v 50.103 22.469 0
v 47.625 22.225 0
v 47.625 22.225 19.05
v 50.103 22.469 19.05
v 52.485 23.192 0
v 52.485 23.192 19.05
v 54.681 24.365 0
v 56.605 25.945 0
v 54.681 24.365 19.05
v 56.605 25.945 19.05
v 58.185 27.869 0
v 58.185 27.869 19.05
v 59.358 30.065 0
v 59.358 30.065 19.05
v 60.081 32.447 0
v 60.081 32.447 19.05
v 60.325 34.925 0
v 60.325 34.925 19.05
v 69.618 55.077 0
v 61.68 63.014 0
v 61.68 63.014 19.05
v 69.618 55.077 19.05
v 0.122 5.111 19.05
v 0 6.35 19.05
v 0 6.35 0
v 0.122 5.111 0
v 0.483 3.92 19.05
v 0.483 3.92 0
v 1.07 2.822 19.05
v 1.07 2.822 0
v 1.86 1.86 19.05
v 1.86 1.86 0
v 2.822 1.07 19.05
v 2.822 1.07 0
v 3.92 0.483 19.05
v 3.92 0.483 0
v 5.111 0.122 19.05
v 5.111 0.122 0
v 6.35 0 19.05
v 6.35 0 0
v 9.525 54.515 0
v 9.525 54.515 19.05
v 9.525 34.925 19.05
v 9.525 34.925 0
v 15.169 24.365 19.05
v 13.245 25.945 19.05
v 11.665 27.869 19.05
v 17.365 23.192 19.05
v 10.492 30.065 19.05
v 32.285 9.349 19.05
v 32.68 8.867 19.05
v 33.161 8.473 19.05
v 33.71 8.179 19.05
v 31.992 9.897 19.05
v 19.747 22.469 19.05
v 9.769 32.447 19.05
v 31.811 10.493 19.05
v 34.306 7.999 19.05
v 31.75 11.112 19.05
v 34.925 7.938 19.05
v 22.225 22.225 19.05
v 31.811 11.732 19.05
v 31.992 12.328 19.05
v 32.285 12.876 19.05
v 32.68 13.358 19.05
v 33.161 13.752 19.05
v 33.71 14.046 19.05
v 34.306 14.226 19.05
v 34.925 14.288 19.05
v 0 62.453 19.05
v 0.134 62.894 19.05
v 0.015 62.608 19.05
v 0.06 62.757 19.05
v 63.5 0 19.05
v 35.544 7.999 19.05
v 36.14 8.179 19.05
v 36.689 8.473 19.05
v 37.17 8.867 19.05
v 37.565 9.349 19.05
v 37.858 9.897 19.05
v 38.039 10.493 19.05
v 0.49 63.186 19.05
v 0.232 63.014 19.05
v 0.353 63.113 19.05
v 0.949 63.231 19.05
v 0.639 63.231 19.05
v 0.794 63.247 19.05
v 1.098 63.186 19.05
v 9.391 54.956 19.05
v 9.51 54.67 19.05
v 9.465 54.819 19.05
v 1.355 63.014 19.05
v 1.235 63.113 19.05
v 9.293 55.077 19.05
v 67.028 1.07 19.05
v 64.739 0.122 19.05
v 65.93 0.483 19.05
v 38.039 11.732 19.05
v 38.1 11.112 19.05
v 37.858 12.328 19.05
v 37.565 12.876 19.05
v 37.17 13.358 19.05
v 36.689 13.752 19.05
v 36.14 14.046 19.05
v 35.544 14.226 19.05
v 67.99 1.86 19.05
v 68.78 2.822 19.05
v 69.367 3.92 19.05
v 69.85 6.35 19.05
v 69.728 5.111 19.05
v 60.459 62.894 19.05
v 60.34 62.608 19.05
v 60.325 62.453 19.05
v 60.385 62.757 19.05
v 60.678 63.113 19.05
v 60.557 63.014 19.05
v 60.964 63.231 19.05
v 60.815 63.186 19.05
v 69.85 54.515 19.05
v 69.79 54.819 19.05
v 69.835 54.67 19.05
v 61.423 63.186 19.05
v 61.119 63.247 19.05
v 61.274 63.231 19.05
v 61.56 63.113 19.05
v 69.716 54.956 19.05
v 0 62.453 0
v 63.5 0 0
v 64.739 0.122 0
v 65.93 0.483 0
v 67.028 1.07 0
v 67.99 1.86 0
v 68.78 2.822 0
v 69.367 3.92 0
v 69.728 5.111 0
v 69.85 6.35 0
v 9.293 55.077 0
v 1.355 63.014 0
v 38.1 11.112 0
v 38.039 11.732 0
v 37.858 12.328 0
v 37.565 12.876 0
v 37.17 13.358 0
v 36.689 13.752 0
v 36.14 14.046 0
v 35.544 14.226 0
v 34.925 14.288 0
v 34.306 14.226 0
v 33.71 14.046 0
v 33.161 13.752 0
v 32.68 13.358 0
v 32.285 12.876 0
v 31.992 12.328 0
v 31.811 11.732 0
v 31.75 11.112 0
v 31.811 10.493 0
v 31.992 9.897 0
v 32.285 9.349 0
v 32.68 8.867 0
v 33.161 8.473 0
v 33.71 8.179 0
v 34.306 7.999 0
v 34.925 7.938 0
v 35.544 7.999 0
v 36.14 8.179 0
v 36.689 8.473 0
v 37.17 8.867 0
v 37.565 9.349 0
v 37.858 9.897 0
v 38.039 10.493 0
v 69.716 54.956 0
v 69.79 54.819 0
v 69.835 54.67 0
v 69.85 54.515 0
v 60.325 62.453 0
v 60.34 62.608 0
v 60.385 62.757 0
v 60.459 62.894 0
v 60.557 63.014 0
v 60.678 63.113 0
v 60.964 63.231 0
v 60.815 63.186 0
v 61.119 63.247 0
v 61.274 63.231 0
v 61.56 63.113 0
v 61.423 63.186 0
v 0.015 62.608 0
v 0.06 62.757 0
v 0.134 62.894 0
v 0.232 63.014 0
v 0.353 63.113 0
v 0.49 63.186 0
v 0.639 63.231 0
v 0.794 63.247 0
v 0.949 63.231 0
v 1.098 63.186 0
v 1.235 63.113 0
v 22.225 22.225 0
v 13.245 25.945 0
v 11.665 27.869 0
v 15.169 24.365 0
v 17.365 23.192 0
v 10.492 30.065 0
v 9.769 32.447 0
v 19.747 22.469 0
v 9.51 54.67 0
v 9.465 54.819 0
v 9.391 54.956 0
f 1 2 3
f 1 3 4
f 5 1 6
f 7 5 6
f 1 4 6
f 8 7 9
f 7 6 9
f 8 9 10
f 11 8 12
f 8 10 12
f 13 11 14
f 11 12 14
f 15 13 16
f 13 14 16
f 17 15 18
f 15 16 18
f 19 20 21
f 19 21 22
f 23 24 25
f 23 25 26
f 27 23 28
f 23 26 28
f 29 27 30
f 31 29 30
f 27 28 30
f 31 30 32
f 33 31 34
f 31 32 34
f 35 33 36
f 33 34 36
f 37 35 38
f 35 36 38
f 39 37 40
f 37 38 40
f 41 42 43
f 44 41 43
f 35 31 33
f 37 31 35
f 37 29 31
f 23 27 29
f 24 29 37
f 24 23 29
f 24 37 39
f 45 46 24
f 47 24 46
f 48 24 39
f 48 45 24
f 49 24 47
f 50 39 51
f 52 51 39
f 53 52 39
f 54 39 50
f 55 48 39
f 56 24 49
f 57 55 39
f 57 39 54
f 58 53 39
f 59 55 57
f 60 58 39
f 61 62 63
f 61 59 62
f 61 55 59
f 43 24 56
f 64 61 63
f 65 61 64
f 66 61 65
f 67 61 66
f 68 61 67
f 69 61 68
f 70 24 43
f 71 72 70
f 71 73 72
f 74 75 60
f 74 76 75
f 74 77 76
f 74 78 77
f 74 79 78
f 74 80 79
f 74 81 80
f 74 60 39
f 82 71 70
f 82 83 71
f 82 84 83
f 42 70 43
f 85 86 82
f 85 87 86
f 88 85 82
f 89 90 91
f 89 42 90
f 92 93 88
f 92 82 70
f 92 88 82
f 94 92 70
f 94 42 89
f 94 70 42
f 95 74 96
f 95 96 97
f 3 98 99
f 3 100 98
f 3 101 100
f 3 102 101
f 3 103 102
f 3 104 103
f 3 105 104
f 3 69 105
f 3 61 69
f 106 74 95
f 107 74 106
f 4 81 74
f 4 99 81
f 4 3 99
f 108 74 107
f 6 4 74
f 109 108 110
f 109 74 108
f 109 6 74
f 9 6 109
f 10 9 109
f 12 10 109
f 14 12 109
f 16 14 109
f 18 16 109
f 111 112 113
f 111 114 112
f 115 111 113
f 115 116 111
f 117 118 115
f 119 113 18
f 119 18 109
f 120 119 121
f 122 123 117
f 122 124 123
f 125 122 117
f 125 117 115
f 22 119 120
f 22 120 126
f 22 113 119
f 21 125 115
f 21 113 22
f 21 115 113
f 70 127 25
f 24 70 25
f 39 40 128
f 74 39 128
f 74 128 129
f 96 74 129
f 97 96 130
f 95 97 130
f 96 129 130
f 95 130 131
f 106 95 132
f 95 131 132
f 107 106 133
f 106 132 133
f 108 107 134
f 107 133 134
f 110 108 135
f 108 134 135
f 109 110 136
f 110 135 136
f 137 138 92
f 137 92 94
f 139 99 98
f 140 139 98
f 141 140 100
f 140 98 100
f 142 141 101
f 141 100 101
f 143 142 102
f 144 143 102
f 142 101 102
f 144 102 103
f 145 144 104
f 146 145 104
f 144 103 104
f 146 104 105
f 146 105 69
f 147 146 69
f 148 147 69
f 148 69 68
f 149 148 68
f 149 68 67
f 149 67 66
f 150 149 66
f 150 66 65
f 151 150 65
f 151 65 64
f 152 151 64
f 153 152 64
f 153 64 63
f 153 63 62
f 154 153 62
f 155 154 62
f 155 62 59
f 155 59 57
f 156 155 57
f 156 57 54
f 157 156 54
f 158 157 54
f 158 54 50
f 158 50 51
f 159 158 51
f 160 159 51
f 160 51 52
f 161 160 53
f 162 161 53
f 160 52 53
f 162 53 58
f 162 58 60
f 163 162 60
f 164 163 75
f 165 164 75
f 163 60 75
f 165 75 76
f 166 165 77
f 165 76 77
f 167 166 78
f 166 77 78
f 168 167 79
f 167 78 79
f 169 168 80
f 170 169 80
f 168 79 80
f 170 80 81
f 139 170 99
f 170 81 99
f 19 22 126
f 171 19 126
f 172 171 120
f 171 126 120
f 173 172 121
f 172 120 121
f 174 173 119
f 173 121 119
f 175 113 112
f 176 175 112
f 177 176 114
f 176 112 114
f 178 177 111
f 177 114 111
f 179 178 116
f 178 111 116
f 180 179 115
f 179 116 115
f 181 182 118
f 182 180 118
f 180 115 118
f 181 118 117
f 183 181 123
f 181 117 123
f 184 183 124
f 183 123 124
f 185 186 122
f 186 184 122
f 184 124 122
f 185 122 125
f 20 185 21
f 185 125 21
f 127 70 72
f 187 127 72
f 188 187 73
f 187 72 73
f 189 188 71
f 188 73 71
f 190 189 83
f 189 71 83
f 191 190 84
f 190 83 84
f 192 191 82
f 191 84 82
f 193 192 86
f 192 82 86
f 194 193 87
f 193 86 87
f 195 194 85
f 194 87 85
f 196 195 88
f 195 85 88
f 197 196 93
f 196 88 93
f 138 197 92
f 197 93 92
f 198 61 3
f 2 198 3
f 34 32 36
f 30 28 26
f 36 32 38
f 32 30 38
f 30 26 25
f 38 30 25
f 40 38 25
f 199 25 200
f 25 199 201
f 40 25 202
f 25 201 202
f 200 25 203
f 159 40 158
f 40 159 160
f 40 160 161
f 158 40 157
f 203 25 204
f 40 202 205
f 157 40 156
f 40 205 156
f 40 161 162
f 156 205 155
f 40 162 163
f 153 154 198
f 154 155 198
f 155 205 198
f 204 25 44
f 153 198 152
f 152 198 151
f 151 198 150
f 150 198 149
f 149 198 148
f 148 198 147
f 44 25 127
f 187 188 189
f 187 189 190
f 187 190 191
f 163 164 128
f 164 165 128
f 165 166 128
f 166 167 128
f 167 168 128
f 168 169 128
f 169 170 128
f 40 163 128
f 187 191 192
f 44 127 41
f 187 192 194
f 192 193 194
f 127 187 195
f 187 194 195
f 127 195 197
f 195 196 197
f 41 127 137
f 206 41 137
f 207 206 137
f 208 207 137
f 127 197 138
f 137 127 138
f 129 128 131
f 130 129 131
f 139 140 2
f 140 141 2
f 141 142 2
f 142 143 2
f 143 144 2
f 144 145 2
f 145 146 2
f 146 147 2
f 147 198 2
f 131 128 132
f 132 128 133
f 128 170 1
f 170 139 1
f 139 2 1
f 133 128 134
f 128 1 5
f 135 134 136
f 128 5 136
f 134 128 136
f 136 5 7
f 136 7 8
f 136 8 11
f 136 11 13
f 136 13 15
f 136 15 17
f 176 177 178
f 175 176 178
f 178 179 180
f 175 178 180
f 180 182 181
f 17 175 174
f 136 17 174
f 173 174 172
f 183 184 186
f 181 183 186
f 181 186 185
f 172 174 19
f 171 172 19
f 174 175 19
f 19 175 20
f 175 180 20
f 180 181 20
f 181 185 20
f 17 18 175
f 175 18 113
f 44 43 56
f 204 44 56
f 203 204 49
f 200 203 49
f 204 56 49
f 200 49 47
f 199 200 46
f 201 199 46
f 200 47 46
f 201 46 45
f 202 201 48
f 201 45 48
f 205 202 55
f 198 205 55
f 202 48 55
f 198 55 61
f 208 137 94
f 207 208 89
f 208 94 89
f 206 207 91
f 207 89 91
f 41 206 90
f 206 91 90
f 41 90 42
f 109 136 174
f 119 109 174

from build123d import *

# Parameters (mm, degrees)
F1_DEPTH = 19.05
F2_R     = 3.175
F3_DEPTH = 19.051
F5_DEPTH = 19.051


with BuildPart() as f1:
    # F0 (on Top) → F1 (new body)
    with BuildSketch(Plane.XY):
        with BuildLine():
            ThreePointArc((0, 6.35), (1.859872, 1.859872), (6.35, 0))
            Line((6.35, 0), (63.5, 0))
            ThreePointArc((63.5, 0), (67.990128, 1.859872), (69.85, 6.35))
            Line((69.85, 6.35), (69.85, 114.3))
            ThreePointArc((69.85, 114.3), (67.990128, 118.790128), (63.5, 120.65))
            Line((63.5, 120.65), (6.35, 120.65))
            ThreePointArc((6.35, 120.65), (1.859872, 118.790128), (0, 114.3))
            Line((0, 114.3), (0, 6.35))
        make_face()
    extrude(amount=F1_DEPTH)

    # F2 (on face) → F3 (cut, through all)
    with BuildSketch(Plane.XY.offset(19.05)):
        with Locations((34.925, 109.5375)):
            Circle(F2_R)
        with Locations((34.925, 11.1125)):
            Circle(F2_R)
        with BuildLine():
            Line((47.625, 98.425), (22.225, 98.425))
            ThreePointArc((22.225, 98.425), (13.244744, 94.705256), (9.525, 85.725))
            Line((9.525, 85.725), (9.525, 34.925))
            ThreePointArc((9.525, 34.925), (13.244744, 25.944744), (22.225, 22.225))
            Line((22.225, 22.225), (47.625, 22.225))
            ThreePointArc((47.625, 22.225), (56.605256, 25.944744), (60.325, 34.925))
            Line((60.325, 34.925), (60.325, 85.725))
            ThreePointArc((60.325, 85.725), (56.605256, 94.705256), (47.625, 98.425))
        make_face()
    extrude(amount=-F3_DEPTH, mode=Mode.SUBTRACT)

    # F4 (on face) → F5 (cut, through all)
    with BuildSketch(Plane.XY.offset(19.05)):
        with BuildLine():
            ThreePointArc((0, 62.452797), (0.489995, 63.186127), (1.355016, 63.014064))
            Line((1.355016, 63.014064), (9.292516, 55.076564))
            ThreePointArc((9.292516, 55.076564), (9.464579, 54.819052), (9.525, 54.515297))
            Line((9.525, 54.515297), (9.525, 85.725))
            ThreePointArc((9.525, 85.725), (13.244744, 94.705256), (22.225, 98.425))
            Line((22.225, 98.425), (47.625, 98.425))
            ThreePointArc((47.625, 98.425), (56.605256, 94.705256), (60.325, 85.725))
            Line((60.325, 85.725), (60.325, 62.452797))
            ThreePointArc((60.325, 62.452797), (60.814995, 63.186127), (61.680016, 63.014064))
            Line((61.680016, 63.014064), (69.617516, 55.076564))
            ThreePointArc((69.617516, 55.076564), (69.789579, 54.819052), (69.85, 54.515297))
            Line((69.85, 54.515297), (69.85, 114.3))
            ThreePointArc((69.85, 114.3), (67.990128, 118.790128), (63.5, 120.65))
            Line((63.5, 120.65), (6.35, 120.65))
            ThreePointArc((6.35, 120.65), (1.859872, 118.790128), (0, 114.3))
            Line((0, 114.3), (0, 62.452797))
        make_face()
    extrude(amount=-F5_DEPTH, mode=Mode.SUBTRACT)


solid = f1.part
